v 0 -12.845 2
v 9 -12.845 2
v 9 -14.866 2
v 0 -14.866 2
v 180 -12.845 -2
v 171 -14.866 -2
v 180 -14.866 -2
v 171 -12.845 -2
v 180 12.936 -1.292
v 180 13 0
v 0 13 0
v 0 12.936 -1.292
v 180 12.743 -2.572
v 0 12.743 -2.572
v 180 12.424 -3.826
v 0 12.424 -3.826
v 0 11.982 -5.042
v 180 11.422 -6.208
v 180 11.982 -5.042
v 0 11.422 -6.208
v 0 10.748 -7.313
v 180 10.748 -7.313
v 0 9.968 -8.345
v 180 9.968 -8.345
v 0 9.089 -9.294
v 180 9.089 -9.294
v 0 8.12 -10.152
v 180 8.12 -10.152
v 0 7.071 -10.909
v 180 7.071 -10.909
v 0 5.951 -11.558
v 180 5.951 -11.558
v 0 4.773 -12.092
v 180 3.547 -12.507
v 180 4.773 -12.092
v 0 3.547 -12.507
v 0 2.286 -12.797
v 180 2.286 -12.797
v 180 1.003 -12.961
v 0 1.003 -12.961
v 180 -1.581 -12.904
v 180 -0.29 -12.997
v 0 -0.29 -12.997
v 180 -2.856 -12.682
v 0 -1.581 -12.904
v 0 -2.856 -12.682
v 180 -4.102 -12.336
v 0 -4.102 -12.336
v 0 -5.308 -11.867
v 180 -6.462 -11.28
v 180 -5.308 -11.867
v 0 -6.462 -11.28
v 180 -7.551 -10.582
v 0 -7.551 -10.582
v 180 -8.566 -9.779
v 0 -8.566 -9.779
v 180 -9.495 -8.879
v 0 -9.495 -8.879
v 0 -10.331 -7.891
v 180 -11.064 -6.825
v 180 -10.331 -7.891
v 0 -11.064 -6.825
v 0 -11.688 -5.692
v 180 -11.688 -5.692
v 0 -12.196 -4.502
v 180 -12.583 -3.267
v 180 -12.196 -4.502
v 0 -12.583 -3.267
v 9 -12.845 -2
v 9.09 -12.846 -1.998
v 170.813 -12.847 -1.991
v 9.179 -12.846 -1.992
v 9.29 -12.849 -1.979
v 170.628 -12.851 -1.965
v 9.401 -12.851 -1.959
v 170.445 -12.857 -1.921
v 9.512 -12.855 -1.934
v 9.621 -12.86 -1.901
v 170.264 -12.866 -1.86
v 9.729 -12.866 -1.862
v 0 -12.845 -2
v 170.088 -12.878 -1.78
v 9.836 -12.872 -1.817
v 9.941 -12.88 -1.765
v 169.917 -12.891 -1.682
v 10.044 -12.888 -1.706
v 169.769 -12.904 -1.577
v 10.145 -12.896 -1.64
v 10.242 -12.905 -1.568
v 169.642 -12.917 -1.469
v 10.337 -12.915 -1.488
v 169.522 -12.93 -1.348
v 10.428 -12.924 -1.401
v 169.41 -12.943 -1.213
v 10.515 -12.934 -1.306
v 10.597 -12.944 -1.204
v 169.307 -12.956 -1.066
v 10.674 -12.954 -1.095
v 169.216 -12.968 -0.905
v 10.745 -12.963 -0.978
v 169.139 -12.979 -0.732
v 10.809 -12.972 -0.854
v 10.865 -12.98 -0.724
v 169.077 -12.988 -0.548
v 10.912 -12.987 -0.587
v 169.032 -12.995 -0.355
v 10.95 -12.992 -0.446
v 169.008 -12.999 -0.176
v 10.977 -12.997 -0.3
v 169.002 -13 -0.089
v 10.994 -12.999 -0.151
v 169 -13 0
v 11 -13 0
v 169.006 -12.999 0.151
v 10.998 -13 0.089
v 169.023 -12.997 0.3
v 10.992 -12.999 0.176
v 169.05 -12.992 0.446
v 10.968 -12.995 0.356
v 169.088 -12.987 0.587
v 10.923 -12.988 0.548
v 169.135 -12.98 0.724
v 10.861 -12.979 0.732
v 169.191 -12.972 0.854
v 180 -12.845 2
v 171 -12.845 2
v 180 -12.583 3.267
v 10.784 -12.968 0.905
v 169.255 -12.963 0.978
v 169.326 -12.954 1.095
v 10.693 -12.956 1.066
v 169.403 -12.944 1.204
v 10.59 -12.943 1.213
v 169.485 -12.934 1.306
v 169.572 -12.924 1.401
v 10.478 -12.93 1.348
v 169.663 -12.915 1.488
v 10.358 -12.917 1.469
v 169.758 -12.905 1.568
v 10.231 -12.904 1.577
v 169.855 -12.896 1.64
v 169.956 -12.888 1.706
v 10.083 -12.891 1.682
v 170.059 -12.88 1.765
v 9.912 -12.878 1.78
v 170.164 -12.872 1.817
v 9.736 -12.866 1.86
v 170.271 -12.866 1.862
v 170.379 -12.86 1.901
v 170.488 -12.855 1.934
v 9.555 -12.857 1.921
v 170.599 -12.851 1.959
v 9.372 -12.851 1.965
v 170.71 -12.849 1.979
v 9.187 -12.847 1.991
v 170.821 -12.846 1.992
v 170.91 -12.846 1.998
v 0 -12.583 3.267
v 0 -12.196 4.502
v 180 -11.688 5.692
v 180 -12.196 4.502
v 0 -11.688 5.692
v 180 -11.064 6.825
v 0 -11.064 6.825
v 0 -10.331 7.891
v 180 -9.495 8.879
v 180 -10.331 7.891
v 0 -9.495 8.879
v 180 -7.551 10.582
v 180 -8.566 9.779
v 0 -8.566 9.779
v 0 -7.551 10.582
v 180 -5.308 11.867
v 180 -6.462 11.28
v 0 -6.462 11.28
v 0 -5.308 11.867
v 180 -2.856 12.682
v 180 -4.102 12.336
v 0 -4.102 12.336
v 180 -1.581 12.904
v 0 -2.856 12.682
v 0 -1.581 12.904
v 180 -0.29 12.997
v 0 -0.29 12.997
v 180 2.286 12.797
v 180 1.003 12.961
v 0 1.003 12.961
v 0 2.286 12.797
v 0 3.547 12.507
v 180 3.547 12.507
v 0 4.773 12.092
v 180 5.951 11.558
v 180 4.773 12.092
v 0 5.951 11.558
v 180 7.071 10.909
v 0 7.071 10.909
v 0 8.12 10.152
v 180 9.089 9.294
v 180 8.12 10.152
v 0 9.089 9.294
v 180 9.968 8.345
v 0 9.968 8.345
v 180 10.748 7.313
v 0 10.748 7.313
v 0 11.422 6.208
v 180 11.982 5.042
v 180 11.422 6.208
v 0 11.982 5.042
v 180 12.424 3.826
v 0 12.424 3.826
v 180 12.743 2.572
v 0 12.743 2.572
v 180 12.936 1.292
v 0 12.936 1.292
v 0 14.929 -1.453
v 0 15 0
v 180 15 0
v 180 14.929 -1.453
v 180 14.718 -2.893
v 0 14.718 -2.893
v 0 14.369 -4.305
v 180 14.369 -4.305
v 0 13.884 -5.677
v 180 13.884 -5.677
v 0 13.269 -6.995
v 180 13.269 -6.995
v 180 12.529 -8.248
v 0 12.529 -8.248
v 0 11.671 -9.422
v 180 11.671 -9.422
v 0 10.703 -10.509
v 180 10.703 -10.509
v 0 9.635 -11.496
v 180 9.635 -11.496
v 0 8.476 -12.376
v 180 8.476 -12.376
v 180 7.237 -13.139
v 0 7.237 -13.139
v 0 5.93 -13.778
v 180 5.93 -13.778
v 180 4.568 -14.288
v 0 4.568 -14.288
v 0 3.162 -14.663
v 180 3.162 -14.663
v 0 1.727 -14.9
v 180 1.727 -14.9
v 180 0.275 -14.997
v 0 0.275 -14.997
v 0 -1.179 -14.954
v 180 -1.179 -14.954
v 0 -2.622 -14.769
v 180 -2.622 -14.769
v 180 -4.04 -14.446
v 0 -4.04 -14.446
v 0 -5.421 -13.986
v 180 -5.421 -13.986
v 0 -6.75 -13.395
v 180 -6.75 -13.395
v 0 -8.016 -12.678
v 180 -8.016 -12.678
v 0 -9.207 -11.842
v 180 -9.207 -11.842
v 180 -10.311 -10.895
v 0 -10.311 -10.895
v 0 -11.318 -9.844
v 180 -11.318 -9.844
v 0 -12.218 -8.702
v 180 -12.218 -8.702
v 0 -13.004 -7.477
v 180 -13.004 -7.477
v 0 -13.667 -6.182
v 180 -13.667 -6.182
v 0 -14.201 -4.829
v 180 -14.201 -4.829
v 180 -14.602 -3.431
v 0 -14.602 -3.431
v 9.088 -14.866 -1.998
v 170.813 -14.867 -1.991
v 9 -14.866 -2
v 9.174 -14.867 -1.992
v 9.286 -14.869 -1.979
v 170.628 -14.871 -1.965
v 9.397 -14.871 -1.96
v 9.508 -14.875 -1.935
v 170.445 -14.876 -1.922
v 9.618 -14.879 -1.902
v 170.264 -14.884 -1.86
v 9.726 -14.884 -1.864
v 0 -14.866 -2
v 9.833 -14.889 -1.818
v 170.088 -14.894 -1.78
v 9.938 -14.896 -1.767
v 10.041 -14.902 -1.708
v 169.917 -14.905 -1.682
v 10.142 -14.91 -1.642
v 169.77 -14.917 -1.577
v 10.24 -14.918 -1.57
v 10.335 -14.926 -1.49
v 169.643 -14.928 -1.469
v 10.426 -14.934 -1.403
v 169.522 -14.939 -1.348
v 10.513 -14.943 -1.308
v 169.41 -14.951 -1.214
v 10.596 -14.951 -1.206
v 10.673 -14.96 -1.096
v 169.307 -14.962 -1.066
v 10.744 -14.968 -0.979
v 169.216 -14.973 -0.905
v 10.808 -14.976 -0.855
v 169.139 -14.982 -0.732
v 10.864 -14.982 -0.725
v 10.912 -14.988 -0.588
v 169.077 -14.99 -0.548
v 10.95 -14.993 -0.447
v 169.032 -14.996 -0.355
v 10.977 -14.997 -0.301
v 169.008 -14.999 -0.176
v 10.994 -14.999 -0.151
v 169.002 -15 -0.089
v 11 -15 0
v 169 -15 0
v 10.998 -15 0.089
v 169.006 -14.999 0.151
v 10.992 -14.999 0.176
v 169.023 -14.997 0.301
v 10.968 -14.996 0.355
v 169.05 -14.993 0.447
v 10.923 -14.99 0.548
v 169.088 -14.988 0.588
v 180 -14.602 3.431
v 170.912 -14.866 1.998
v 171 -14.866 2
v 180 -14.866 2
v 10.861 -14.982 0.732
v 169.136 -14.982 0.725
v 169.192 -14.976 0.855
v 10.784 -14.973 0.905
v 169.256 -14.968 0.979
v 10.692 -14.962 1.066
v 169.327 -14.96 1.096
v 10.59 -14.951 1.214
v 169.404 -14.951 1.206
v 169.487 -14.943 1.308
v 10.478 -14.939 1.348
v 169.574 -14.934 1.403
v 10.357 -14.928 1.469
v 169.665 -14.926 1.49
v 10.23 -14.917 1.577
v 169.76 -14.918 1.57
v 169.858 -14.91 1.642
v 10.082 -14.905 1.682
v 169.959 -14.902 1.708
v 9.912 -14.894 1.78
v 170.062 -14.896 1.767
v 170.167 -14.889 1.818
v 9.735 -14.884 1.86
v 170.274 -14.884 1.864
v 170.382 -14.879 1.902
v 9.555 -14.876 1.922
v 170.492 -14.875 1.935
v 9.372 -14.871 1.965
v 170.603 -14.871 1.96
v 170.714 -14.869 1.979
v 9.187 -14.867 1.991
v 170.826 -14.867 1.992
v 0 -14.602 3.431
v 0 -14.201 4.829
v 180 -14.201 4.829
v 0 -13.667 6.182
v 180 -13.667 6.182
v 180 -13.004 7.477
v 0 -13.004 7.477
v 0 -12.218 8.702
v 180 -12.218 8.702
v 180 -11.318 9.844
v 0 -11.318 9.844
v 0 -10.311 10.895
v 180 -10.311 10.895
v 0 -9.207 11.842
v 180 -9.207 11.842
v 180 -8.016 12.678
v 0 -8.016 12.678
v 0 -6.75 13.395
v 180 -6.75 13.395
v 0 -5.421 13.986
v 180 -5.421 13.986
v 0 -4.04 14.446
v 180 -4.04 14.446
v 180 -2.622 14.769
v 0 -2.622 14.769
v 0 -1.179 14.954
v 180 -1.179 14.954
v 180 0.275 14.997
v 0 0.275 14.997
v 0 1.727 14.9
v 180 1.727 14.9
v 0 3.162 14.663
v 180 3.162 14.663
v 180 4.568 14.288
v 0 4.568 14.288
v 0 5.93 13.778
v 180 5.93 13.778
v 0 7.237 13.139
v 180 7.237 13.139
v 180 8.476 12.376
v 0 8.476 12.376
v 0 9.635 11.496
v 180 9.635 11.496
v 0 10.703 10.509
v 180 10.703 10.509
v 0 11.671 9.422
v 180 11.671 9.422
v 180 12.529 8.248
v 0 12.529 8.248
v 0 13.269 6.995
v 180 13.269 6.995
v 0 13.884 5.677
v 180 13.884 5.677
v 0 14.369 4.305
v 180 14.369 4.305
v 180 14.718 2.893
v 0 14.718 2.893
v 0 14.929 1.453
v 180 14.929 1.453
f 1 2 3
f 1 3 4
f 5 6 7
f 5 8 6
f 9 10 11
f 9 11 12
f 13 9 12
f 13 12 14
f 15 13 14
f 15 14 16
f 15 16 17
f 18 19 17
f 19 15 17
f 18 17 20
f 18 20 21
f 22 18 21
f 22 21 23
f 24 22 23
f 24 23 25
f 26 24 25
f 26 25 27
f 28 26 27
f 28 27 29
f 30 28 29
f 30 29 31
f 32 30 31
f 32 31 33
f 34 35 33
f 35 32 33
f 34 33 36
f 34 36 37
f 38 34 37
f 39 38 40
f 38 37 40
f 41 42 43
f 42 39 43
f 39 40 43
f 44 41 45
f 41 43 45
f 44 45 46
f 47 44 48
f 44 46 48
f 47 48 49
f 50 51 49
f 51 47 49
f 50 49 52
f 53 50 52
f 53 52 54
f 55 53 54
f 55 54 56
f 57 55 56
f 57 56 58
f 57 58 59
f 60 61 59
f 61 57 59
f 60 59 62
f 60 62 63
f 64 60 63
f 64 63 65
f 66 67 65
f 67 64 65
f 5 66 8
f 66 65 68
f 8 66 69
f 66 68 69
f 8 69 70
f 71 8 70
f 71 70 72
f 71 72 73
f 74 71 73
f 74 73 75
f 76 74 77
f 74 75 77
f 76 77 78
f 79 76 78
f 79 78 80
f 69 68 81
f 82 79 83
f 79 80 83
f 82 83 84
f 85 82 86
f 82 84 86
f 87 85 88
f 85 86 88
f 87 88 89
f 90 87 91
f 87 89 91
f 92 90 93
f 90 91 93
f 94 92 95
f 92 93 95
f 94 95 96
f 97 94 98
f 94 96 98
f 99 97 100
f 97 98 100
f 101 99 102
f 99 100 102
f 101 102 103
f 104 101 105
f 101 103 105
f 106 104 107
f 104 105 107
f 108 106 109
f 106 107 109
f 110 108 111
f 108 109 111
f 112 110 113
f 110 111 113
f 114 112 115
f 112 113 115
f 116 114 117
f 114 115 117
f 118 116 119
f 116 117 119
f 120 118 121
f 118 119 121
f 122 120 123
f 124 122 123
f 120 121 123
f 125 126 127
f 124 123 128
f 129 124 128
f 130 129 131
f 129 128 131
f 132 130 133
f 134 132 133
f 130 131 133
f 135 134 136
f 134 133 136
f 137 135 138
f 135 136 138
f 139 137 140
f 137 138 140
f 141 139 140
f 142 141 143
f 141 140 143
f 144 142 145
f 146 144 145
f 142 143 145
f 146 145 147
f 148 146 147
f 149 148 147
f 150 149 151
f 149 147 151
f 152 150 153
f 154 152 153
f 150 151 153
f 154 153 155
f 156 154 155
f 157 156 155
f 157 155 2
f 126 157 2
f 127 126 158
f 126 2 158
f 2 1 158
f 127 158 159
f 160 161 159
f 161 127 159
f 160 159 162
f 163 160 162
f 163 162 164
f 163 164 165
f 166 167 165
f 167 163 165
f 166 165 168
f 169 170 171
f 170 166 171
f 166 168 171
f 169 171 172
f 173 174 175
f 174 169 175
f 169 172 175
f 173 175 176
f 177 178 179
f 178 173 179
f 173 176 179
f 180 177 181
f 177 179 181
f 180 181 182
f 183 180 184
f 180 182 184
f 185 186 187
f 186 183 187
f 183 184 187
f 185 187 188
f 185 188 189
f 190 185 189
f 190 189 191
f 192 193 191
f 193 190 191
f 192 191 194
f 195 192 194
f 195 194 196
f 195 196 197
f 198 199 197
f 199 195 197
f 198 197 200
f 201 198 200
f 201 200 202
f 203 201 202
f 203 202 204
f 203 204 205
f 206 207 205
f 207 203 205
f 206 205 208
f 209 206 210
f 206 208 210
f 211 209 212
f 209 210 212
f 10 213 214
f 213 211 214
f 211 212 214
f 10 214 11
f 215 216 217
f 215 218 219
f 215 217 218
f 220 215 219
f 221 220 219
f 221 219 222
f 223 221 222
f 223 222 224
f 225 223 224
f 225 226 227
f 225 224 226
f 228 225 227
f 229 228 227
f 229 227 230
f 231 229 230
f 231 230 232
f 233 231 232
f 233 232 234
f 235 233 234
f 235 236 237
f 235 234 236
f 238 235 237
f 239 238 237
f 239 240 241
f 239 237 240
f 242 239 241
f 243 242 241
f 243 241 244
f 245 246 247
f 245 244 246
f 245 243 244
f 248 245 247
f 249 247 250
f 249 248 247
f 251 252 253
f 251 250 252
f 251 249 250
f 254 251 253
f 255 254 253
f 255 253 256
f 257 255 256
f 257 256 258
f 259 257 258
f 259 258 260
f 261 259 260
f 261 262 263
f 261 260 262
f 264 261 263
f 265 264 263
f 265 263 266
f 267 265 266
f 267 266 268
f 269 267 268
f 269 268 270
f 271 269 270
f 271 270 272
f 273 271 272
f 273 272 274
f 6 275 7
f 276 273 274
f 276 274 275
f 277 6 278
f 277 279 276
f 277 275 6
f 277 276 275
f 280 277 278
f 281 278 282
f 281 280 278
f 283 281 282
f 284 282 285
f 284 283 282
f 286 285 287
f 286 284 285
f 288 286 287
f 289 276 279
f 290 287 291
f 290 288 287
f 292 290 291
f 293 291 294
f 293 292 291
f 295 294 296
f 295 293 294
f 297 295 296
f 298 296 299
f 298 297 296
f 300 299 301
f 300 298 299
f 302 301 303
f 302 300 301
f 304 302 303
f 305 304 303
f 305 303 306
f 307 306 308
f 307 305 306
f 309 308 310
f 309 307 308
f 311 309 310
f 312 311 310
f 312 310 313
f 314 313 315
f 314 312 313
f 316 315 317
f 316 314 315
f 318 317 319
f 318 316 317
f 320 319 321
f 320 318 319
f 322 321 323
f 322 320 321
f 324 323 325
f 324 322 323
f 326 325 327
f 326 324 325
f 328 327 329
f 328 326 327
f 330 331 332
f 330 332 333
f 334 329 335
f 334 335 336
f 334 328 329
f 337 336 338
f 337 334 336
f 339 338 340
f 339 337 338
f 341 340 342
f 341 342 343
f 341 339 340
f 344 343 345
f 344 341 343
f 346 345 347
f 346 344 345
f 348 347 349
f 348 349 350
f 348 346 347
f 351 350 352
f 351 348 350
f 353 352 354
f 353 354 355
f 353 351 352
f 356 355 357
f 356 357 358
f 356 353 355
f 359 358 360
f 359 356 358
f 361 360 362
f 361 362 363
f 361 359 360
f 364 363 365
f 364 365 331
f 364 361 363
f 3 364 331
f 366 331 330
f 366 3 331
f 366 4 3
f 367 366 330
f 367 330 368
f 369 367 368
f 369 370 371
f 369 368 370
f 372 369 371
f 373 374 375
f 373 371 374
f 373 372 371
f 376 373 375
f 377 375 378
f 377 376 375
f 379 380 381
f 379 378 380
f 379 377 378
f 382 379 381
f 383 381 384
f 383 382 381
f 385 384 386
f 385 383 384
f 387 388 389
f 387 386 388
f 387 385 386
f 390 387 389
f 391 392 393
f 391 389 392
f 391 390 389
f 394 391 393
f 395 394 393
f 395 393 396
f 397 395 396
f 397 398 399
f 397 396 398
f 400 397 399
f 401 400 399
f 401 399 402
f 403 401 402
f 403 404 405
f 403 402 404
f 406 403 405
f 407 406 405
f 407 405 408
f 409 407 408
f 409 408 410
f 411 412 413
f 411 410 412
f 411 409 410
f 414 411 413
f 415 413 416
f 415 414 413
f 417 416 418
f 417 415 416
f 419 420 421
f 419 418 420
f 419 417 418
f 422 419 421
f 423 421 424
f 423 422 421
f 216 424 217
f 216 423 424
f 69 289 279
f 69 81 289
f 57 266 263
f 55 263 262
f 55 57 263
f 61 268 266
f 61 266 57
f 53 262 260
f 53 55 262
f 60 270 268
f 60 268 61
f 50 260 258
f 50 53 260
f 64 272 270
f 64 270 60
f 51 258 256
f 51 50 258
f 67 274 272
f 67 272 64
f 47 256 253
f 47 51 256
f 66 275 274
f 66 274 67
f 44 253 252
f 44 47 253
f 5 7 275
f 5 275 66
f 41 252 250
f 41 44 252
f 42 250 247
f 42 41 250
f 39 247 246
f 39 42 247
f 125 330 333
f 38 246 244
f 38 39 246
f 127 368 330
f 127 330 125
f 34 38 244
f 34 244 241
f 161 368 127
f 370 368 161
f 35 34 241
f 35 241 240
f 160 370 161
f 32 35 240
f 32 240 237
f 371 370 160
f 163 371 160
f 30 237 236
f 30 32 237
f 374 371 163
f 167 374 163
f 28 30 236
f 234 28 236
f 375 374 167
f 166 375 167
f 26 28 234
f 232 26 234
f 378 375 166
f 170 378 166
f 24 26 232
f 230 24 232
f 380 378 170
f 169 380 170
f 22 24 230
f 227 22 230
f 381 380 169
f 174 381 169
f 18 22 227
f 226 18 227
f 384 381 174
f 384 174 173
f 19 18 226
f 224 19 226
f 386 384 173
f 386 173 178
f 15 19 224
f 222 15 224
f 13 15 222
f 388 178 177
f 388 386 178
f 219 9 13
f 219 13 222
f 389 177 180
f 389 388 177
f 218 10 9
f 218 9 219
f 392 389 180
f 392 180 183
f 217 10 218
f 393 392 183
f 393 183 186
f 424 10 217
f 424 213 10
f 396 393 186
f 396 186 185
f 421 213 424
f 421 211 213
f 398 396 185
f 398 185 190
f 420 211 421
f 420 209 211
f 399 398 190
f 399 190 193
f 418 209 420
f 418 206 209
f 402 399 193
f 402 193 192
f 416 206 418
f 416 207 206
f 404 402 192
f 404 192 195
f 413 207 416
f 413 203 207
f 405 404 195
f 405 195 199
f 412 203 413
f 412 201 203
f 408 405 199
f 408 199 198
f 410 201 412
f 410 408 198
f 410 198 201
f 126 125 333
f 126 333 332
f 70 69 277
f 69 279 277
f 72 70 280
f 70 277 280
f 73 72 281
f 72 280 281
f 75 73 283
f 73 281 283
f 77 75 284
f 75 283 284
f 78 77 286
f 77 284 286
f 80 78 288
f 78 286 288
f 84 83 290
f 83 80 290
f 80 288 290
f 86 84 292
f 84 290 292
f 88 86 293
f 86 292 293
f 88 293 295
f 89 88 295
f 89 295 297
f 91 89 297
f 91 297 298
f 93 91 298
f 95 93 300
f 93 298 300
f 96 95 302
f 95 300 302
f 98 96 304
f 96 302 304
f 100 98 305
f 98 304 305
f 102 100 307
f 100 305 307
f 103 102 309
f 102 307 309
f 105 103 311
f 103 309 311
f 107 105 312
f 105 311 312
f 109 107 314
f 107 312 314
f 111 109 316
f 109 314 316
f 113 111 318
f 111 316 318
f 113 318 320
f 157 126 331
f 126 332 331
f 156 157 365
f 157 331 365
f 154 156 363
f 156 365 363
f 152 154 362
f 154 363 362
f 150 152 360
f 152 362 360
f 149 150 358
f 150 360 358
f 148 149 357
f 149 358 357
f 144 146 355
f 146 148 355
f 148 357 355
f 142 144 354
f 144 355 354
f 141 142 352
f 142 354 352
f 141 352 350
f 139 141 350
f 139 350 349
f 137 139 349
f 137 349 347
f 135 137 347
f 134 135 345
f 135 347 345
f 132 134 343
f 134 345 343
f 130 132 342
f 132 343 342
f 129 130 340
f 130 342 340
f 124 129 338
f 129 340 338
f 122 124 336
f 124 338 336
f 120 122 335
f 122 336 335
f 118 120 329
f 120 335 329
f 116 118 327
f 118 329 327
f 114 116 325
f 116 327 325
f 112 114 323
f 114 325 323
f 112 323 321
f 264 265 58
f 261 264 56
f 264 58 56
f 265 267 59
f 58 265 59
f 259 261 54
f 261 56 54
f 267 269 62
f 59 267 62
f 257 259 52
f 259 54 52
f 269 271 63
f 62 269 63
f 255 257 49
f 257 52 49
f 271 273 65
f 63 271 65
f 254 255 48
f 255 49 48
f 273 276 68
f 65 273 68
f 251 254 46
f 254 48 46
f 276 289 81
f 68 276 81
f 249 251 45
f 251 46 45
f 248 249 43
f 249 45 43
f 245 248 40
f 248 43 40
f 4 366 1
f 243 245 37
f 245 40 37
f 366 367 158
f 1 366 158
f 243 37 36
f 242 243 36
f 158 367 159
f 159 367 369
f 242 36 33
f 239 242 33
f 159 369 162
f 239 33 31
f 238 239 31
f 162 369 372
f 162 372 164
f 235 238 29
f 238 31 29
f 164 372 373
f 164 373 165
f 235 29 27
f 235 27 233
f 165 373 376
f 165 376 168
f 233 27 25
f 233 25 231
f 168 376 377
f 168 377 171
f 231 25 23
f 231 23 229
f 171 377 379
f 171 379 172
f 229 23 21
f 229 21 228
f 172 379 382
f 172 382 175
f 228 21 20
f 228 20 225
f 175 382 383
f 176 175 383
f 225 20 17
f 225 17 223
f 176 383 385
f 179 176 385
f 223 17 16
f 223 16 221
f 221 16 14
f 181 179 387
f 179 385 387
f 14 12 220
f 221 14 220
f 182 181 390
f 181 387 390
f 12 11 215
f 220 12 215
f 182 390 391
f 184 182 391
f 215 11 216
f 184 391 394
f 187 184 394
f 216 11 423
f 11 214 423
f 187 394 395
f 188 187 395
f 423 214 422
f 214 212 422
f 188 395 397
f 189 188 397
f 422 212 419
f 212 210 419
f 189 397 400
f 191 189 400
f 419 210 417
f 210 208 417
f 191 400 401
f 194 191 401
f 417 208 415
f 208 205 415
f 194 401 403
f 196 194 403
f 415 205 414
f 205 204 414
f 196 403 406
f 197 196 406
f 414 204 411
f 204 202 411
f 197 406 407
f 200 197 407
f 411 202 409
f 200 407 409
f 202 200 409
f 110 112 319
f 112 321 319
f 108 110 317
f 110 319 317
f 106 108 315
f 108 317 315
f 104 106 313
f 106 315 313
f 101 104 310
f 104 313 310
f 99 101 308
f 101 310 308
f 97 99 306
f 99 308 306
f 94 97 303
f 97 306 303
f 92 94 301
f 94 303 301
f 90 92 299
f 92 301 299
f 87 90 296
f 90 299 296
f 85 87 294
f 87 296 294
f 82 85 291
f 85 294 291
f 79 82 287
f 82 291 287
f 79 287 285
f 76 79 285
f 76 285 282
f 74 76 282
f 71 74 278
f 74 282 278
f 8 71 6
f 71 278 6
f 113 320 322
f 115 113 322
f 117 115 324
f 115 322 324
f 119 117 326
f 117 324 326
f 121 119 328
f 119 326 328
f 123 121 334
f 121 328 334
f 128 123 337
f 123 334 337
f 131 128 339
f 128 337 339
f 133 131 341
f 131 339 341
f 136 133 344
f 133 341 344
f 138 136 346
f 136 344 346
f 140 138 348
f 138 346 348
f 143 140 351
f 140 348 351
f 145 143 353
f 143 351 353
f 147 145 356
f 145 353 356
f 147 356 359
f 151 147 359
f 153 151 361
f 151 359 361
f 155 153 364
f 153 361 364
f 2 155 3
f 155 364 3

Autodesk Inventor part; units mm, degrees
ref_plane "YZ Plane" through (0, 0, 0) normal (1, 0, 0) x (0, 1, 0)
sketch "Sketch1" plane through (0, 0, 0) normal (1, 0, 0) x (0, 1, 0)
  circle A0 centre (0, 0) radius 15
  circle A1 centre (0, 0) radius 13
  dimension "d0" = 30
  dimension "d1" = 26
extrude "Extrusion1" add sketch "Sketch1" along normal blind 180
sketch "Sketch2" plane through (0, 0, 0) normal (0, 1, 0) x (-1, 0, 0)
  line L0 (0, 0) -> (-180, 0) construction
  line L1 (-180, 15) -> (-180, -15) construction
  line L2 (-11, 2) -> (0, 2)
  line L3 (0, 2) -> (0, -2)
  line L4 (0, -2) -> (-11, -2)
  line L5 (-11, -2) -> (-11, 2)
  line L6 (-11, 2) -> (0, -2)
  line L7 (0, 2) -> (-11, -2)
  line L8 (0, -15) -> (0, 15) projected
  line L9 (0, 15) -> (0, -15)
  line L10 (0, -15) -> (-180, -15) projected
  point P0 (-5.5, 0)
  dimension "d4" = 4
  dimension "d5" = 11
extrude "Extrusion2" cut sketch "Sketch2" against normal through all
fillet "Fillet1" radius 2 2 edges at (11, -13.8557, 2) (11, -13.8557, -2)
ref_plane "Work Plane1" through (90, 0, 0) normal (-1, 0, 0) x (0, 0, 1)
mirror "Mirror1" about plane through (90, 0, 0) normal (-1, 0, 0) of "Extrusion2", "Fillet1"
ref_plane "Work Plane2" through (0, -15, 0) normal (0, 1, 0) x (-1, 0, 0)
properties part number "Laser_tube" material "Polycarbonate, Clear"
